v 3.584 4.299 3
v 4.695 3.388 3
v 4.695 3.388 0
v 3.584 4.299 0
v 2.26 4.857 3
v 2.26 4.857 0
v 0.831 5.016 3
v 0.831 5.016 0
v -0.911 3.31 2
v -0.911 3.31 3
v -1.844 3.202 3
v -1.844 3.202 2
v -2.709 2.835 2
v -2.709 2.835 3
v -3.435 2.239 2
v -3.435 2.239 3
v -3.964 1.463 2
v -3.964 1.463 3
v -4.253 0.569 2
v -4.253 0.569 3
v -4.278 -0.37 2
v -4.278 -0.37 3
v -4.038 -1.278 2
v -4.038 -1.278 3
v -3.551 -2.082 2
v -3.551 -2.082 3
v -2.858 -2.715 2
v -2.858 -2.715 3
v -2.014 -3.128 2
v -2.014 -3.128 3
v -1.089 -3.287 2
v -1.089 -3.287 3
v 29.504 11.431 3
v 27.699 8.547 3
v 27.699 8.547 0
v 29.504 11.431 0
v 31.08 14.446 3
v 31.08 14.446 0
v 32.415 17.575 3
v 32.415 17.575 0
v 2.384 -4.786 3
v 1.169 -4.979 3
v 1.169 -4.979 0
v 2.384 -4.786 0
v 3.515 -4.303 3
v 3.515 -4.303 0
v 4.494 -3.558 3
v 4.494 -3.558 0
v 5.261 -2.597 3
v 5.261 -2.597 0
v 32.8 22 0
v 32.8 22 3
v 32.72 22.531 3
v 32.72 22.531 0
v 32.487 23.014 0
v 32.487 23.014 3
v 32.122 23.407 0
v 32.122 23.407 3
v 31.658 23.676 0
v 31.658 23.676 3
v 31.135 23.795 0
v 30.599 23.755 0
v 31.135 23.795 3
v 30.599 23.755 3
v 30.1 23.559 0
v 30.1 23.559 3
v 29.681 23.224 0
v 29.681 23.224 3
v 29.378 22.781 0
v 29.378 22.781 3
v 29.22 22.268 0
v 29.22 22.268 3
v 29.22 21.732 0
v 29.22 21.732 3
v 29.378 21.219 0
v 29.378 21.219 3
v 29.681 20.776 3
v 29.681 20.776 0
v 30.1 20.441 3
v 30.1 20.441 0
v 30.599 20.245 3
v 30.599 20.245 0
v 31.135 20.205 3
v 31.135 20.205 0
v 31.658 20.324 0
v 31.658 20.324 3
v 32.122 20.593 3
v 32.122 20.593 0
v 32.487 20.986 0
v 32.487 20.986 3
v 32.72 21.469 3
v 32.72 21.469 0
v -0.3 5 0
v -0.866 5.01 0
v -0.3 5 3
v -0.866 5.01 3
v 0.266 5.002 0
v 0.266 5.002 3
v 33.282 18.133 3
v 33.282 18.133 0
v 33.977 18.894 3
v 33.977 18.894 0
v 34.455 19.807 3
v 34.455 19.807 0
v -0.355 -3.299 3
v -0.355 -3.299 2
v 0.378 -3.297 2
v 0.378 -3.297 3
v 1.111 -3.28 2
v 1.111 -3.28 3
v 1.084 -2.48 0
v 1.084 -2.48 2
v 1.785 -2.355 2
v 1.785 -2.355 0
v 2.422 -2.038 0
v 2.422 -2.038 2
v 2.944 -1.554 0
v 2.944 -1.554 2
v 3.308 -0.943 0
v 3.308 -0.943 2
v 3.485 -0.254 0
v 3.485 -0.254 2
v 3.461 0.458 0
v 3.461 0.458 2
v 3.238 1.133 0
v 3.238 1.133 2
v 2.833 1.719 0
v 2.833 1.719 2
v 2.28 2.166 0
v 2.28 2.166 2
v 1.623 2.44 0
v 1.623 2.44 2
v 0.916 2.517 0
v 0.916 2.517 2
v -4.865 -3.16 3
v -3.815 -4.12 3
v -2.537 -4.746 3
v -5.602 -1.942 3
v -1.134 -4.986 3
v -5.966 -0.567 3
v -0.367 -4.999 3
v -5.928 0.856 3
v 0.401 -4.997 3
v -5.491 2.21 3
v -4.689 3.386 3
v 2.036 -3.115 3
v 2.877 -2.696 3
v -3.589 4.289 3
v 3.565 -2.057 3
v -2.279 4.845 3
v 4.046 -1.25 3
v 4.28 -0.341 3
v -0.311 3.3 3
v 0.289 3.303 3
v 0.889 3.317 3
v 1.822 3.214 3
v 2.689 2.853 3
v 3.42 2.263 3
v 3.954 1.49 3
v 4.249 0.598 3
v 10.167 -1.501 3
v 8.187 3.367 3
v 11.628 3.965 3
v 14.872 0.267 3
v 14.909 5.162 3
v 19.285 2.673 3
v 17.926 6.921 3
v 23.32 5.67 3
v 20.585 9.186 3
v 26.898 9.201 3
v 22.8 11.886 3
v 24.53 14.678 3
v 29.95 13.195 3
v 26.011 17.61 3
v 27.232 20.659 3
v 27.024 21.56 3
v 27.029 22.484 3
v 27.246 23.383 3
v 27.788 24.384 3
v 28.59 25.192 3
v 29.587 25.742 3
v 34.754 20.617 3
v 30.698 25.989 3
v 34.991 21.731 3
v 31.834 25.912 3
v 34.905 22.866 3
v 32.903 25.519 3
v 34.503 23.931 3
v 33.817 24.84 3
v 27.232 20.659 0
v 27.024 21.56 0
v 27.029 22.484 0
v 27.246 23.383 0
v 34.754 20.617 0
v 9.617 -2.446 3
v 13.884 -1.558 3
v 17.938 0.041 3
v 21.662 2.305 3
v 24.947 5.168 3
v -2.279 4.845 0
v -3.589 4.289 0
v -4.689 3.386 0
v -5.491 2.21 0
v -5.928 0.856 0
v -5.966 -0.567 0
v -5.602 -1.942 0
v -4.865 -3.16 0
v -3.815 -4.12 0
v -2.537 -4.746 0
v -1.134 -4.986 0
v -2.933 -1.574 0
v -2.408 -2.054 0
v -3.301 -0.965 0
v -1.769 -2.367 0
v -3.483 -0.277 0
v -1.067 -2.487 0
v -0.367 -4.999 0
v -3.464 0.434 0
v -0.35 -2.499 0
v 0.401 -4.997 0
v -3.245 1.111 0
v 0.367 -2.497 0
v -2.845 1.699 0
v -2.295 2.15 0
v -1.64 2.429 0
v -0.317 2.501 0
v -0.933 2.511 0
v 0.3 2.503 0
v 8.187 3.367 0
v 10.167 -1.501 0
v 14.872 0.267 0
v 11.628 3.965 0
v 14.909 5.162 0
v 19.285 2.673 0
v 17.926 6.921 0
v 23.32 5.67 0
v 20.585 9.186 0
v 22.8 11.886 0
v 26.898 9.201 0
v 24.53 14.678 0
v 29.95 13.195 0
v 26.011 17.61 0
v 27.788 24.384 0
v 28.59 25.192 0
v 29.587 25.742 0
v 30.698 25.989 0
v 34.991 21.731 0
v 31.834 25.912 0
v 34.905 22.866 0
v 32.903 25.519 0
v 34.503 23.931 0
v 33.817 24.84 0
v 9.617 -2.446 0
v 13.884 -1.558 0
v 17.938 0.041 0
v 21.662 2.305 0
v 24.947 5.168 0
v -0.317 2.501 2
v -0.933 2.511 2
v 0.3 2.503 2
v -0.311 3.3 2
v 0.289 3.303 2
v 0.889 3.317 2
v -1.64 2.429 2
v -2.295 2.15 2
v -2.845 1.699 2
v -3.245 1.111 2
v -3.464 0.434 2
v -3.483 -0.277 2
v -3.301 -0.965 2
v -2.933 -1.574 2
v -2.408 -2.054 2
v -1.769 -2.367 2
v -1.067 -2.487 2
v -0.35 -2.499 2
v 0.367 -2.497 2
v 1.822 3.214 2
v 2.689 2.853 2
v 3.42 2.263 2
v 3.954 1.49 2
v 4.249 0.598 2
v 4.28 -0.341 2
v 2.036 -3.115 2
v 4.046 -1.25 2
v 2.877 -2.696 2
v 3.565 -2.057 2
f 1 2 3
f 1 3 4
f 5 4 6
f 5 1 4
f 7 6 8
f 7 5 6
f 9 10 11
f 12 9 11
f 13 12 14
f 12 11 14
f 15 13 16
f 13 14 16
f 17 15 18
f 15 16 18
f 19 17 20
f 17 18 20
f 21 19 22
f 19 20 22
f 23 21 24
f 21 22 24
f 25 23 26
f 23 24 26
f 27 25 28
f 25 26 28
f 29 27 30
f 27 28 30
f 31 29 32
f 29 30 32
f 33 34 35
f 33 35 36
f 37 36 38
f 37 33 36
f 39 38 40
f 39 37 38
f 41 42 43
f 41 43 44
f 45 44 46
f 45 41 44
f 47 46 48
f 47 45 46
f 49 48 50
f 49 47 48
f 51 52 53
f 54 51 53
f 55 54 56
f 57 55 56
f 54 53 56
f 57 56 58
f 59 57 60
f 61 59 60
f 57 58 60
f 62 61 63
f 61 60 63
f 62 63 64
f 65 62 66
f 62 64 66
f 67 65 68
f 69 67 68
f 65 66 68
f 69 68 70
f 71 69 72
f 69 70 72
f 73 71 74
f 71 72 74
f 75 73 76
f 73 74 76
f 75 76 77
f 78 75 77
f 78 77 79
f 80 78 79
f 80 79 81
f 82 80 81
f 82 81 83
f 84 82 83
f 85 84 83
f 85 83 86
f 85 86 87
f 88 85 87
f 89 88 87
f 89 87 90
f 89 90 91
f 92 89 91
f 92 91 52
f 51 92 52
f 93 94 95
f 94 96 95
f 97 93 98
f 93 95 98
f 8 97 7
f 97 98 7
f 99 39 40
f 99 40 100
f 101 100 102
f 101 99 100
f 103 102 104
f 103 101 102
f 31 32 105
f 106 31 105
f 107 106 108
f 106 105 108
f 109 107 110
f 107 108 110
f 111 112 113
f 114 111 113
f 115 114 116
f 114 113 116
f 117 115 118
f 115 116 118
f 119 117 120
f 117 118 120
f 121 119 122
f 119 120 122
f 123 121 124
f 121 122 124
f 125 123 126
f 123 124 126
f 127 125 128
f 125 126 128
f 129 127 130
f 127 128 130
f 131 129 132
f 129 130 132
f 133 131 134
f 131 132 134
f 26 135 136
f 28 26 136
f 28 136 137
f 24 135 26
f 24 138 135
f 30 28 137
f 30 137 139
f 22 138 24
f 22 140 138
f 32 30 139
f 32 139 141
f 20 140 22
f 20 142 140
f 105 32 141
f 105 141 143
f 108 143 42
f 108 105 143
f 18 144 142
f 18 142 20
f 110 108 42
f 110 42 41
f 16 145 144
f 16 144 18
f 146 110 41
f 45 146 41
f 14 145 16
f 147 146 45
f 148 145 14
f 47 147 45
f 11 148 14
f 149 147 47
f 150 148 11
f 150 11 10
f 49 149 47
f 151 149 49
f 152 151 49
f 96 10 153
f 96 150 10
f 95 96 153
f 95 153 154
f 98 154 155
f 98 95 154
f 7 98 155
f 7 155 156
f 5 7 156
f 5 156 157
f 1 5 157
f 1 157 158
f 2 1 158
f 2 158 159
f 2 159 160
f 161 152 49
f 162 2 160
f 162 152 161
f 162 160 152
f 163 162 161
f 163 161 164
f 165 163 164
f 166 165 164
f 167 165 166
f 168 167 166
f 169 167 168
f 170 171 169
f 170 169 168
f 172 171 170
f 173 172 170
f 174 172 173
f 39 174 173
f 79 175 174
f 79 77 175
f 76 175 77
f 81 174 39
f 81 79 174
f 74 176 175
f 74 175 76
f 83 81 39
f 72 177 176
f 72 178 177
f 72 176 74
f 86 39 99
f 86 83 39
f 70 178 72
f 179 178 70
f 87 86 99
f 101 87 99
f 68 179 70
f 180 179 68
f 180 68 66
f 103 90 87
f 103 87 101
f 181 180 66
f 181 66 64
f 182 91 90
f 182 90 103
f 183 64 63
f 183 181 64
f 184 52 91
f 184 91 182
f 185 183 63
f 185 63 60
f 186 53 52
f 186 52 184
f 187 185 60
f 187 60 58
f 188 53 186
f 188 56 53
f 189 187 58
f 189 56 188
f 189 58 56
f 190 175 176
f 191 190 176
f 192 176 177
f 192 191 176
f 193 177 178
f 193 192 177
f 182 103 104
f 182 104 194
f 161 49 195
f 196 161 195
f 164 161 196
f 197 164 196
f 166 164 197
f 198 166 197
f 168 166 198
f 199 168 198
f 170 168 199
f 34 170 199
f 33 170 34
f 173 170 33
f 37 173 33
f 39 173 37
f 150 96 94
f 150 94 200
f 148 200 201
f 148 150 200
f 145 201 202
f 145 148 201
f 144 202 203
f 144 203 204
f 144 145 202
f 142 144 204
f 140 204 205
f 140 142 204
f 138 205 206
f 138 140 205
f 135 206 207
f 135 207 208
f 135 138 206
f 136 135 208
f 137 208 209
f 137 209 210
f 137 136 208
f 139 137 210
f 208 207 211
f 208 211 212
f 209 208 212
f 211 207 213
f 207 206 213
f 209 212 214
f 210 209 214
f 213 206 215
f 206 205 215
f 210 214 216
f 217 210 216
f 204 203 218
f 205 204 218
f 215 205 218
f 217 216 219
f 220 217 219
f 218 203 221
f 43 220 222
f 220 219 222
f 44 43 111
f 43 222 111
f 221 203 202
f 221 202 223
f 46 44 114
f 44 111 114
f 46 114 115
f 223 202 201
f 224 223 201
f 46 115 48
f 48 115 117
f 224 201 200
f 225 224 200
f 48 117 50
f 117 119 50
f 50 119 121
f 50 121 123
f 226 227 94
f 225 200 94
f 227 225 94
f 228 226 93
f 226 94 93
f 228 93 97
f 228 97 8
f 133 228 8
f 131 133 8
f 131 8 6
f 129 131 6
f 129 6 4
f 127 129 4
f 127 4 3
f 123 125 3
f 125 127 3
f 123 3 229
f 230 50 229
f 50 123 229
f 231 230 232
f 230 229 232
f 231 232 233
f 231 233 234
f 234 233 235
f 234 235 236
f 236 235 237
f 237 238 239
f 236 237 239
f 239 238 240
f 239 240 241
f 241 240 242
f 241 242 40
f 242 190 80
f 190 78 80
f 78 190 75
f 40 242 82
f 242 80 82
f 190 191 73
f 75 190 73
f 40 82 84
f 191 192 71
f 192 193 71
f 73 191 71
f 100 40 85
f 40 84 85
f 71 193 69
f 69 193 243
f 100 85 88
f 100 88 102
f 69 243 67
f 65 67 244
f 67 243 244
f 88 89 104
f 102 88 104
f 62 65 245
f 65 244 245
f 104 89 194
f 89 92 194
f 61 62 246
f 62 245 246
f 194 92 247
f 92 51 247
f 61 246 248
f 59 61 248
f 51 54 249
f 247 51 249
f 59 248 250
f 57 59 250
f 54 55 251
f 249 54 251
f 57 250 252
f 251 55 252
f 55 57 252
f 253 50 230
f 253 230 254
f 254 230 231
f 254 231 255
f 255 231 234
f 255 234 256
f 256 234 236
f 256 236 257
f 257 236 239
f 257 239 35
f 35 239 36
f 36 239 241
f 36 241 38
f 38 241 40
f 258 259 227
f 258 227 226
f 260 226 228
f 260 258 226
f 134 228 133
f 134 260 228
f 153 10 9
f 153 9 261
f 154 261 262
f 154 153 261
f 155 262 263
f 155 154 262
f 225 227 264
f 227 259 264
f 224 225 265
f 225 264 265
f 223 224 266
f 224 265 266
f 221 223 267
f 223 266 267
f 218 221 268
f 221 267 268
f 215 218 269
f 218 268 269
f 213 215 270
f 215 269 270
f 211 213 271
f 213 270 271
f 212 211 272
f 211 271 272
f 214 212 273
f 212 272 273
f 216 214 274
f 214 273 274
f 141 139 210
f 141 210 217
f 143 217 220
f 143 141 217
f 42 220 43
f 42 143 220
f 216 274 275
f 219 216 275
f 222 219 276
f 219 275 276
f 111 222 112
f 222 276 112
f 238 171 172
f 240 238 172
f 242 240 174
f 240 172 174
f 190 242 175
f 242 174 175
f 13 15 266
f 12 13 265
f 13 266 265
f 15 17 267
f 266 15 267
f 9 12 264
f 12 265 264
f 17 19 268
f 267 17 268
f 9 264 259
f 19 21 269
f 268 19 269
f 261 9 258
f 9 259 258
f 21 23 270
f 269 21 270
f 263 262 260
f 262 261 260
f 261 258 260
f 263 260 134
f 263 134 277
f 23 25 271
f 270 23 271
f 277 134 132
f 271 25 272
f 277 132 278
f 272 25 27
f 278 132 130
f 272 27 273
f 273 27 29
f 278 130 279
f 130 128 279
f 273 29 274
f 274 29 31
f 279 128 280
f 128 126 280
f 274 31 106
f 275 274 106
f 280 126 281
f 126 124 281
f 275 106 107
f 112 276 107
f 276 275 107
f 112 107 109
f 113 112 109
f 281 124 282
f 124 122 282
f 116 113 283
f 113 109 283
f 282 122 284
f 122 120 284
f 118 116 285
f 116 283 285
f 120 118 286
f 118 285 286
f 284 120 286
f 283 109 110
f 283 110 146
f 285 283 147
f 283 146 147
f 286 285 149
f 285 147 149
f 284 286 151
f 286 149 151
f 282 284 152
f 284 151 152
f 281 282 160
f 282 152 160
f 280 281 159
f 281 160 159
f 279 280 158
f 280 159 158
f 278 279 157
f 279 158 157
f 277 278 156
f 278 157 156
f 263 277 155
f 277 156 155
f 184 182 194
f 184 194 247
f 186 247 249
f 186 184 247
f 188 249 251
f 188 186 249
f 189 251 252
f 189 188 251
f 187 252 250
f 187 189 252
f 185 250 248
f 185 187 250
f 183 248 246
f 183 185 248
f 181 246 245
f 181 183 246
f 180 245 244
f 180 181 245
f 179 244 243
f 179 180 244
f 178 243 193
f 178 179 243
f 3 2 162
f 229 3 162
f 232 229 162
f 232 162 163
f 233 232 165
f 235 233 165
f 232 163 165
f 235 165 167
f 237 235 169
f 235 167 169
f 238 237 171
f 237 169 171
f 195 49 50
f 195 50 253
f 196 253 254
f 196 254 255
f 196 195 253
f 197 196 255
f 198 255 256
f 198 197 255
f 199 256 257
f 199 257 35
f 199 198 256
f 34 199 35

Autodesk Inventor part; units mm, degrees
ref_plane "YZ Plane" through (0, 0, 0) normal (1, 0, 0) x (0, 1, 0)
ref_plane "XZ Plane" through (0, 0, 0) normal (0, 1, 0) x (-1, 0, 0)
ref_plane "XY Plane" through (0, 0, 0) normal (0, 0, 1) x (1, 0, 0)
sketch "Sketch1" plane through (0, 0, 0) normal (0, 0, 1) x (1, 0, 0)
  circle A0 centre (31, 22) radius 1.25
  circle A1 centre (31, 22) radius 3
  arc A2 (0, 0) -> (31, 22) centre (-0.1128, 32.9998) ccw construction
  arc A3 (0.0103, -3) -> (33.8284, 21) centre (-0.1128, 32.9998) ccw
  arc A4 (-0.0103, 3) -> (28.1716, 23) centre (-0.1128, 32.9998) ccw
  arc A5 (-0.0103, 3) -> (0.0103, -3) centre (0, 0) ccw
  arc A6 (33.8284, 21) -> (28.1716, 23) centre (31, 22) ccw
  point P0 (41.5332, 21.1583)
  point P1 (35.8668, 23.1312)
  point P2 (33.8284, 21)
  point P3 (28.1716, 23)
  dimension "d1" = 30
  dimension "d21" = 6
  dimension "d22" = 2.5
  dimension "d23" = 31
  dimension "d24" = 22
extrude "Extrusion1" add sketch "Sketch1" along normal blind 3
sketch "Sketch3" plane through (0, 0, 3) normal (0, 0, 1) x (1, 0, 0)
  arc A0 (-1, 0.0117) -> (1, 0.0186) centre (-0.1128, 32.9998) ccw construction
  arc A1 (-1.1344, -4.9865) -> (1.1686, -4.9786) centre (-0.1128, 32.9998) ccw
  arc A2 (-0.8656, 5.0099) -> (0.8314, 5.0157) centre (-0.1128, 32.9998) ccw
  arc A3 (-0.8656, 5.0099) -> (-1.1344, -4.9865) centre (-1, 0.0117) ccw
  arc A4 (1.1686, -4.9786) -> (0.8314, 5.0157) centre (1, 0.0186) ccw
  arc A5 (0.0103, -3) -> (33.8284, 21) centre (-0.1128, 32.9998) ccw projected
  point P0 (0, 0)
  dimension "d31" = 10
  dimension "d32" = 1
  dimension "d33" = 1
extrude "Extrusion3" add sketch "Sketch3" against normal blind 3
sketch "Sketch4" plane through (0, 0, 3) normal (0, 0, -1) x (1, 0, 0)
  arc A0 (-1.1344, 4.9865) -> (-0.8656, -5.0099) centre (-1, -0.0117) ccw projected
  arc A1 (1.1686, 4.9786) -> (-1.1344, 4.9865) centre (-0.1128, -32.9998) ccw projected
  arc A2 (0.8314, -5.0157) -> (-0.8656, -5.0099) centre (-0.1128, -32.9998) ccw projected
  arc A3 (1, -0.0186) -> (-1, -0.0117) centre (-0.1128, -32.9998) ccw construction
  arc A4 (1.0843, 2.48) -> (-1.0672, 2.4874) centre (-0.1128, -32.9998) ccw
  arc A5 (0.9157, -2.5172) -> (-0.9328, -2.5108) centre (-0.1128, -32.9998) ccw
  arc A6 (0.9157, -2.5172) -> (1.0843, 2.48) centre (1, -0.0186) ccw
  arc A7 (-1.0672, 2.4874) -> (-0.9328, -2.5108) centre (-1, -0.0117) ccw
  arc A8 (28.1716, -23) -> (4.6946, -3.3875) centre (-0.1128, -32.9998) ccw projected
  arc A9 (28.1716, -23) -> (33.8284, -21) centre (31, -22) ccw projected
  arc A10 (33.8284, -21) -> (5.2614, 2.5968) centre (-0.1128, -32.9998) ccw projected
  arc A11 (5.2614, 2.5968) -> (1.1686, 4.9786) centre (1, -0.0186) ccw projected
  arc A12 (0.8314, -5.0157) -> (4.6946, -3.3875) centre (1, -0.0186) ccw projected
  arc A13 (0.8887, -3.3167) -> (-0.9113, -3.3105) centre (-0.1128, -32.9998) ccw
  arc A14 (0.8887, -3.3167) -> (1.1113, 3.2795) centre (1, -0.0186) ccw
  arc A15 (1.1113, 3.2795) -> (-1.0887, 3.2871) centre (-0.1128, -32.9998) ccw
  arc A16 (-1.0887, 3.2871) -> (-0.9113, -3.3105) centre (-1, -0.0117) ccw
  point P0 (0, 0)
  dimension "d43" = 5
  dimension "d52" = 0.8
extrude "Extrusion4" cut sketch "Sketch4" along normal through all contours A6 A5 A7 A4
sketch "Sketch5" plane through (0, 0, 3) normal (0, 0, 1) x (1, 0, 0)
  circle A0 centre (31, 22) radius 1.25 projected
  arc A1 (0, 0) -> (31, 22) centre (-0.1128, 32.9998) ccw construction
  arc A2 (34.7535, 20.6174) -> (27.2465, 23.3826) centre (31, 22) ccw
  arc A3 (26.9479, 22.5719) -> (34.4549, 19.8068) centre (30.7014, 21.1893) ccw
  line L0 (30.0441, 21.4413) -> (31.2665, 20.9727)
  line L1 (32.5586, 21.449) -> (29.5201, 22.5232)
  line L2 (26.9479, 22.5719) -> (27.2465, 23.3826)
  line L3 (34.4549, 19.8068) -> (34.7535, 20.6174)
  circle A4 centre (31, 22) radius 1.8
  dimension "d44" = 8
  dimension "d46" = 1.5
  dimension "d47" = 3.6
extrude "Extrusion5" cut sketch "Sketch5" against normal up to surface (3 mm away) contours A4
extrude "Extrusion6" add sketch "Sketch5" against normal up to surface (3 mm away) contours L3 A3 L2 A2
extrude "Extrusion7" cut sketch "Sketch4" along normal blind 1 contours A13 A16 A15 A14
sketch "Sketch6" plane through (0, 0, 0) normal (0, 0, -1) x (-1, 0, 0)
  circle A0 centre (-31, 22) radius 1.8 projected
  arc A1 (-32.4154, 17.5752) -> (-5.2614, -2.5968) centre (0.1128, 32.9998) ccw projected
  arc A2 (-5.2614, -2.5968) -> (-1.1686, -4.9786) centre (-1, 0.0186) ccw projected
  arc A3 (-1.1686, -4.9786) -> (1.1344, -4.9865) centre (0.1128, 32.9998) ccw projected
  arc A4 (1.1344, -4.9865) -> (0.8656, 5.0099) centre (1, 0.0117) ccw projected
  arc A5 (-0.8314, 5.0157) -> (0.8656, 5.0099) centre (0.1128, 32.9998) ccw projected
  arc A6 (-0.8314, 5.0157) -> (-4.6946, 3.3875) centre (-1, 0.0186) ccw projected
  arc A7 (-26.899, 19.9475) -> (-4.6946, 3.3875) centre (0.1128, 32.9998) ccw projected
  arc A8 (-26.899, 19.9475) -> (-26.9479, 22.5719) centre (-30.7014, 21.1893) ccw projected
  line L0 (-26.9479, 22.5719) -> (-27.2465, 23.3826) projected
  arc A9 (-27.2465, 23.3826) -> (-34.7535, 20.6174) centre (-31, 22) ccw projected
  line L1 (-34.7535, 20.6174) -> (-34.4549, 19.8068) projected
  arc A10 (-34.4549, 19.8068) -> (-32.4154, 17.5752) centre (-30.7014, 21.1893) ccw projected
  arc A11 (-1.0843, -2.48) -> (1.0672, -2.4874) centre (0.1128, 32.9998) ccw projected
  arc A12 (-0.9157, 2.5172) -> (-1.0843, -2.48) centre (-1, 0.0186) ccw projected
  arc A13 (-0.9157, 2.5172) -> (0.9328, 2.5108) centre (0.1128, 32.9998) ccw projected
  arc A14 (1.0672, -2.4874) -> (0.9328, 2.5108) centre (1, 0.0117) ccw projected
  arc A15 (-27.2465, 23.3826) -> (-34.7535, 20.6174) centre (-31, 22) ccw projected
  arc A16 (-27.2315, 20.6591) -> (-27.2465, 23.3826) centre (-31, 22) ccw
  arc A17 (-26.899, 19.9475) -> (-4.6946, 3.3875) centre (0.1128, 32.9998) ccw projected
  arc A18 (-27.2315, 20.6591) -> (-26.899, 19.9475) centre (0.1128, 32.9998) ccw
  arc A19 (-26.899, 19.9475) -> (-4.6946, 3.3875) centre (0.1128, 32.9998) ccw projected
  point P0 (0, 0)
extrude "Extrusion8" cut sketch "Sketch6" against normal up to surface (3 mm away) contours L0 A8 A18 A16
sketch "Sketch7" plane through (0, 0, 3) normal (0, 0, 1) x (1, 0, 0)
  arc A0 (34.7535, 20.6174) -> (27.2315, 20.6591) centre (31, 22) ccw projected
  arc A1 (4.6946, 3.3875) -> (27.2315, 20.6591) centre (-0.1128, 32.9998) ccw projected
  arc A2 (4.6946, 3.3875) -> (0.8314, 5.0157) centre (1, 0.0186) ccw projected
  arc A3 (-0.8656, 5.0099) -> (0.8314, 5.0157) centre (-0.1128, 32.9998) ccw projected
  arc A4 (-0.8656, 5.0099) -> (-1.1344, -4.9865) centre (-1, 0.0117) ccw projected
  arc A5 (-1.1344, -4.9865) -> (1.1686, -4.9786) centre (-0.1128, 32.9998) ccw projected
  arc A6 (1.1686, -4.9786) -> (5.2614, -2.5968) centre (1, 0.0186) ccw projected
  arc A7 (5.2614, -2.5968) -> (32.4154, 17.5752) centre (-0.1128, 32.9998) ccw projected
  arc A8 (32.4154, 17.5752) -> (34.4549, 19.8068) centre (30.7014, 21.1893) ccw projected
  line L0 (34.4549, 19.8068) -> (34.7535, 20.6174) projected
  circle A9 centre (31, 22) radius 1.8 projected
  arc A10 (-1.0887, -3.2871) -> (1.1113, -3.2795) centre (-0.1128, 32.9998) ccw projected
  arc A11 (-0.9113, 3.3105) -> (-1.0887, -3.2871) centre (-1, 0.0117) ccw projected
  arc A12 (-0.9113, 3.3105) -> (0.8887, 3.3167) centre (-0.1128, 32.9998) ccw projected
  arc A13 (1.1113, -3.2795) -> (0.8887, 3.3167) centre (1, 0.0186) ccw projected
  arc A14 (5.2614, -2.5968) -> (32.4154, 17.5752) centre (-0.1128, 32.9998) ccw projected
  arc A15 (5.2614, -2.5968) -> (27.6993, 8.5472) centre (6.5569, 22.9556) ccw
  arc A16 (27.6993, 8.5472) -> (32.4154, 17.5752) centre (-8.4143, 33.1583) ccw
  arc A17 (4.6946, 3.3875) -> (22.8001, 11.886) centre (6.5569, 22.9556) ccw
  arc A18 (34.7535, 20.6174) -> (27.2315, 20.6591) centre (31, 22) ccw projected
  arc A19 (22.8001, 11.886) -> (27.2315, 20.6591) centre (-8.4143, 33.1583) ccw
  line L1 (5.2614, -2.5968) -> (4.6946, 3.3875)
  line L2 (4.6946, 3.3875) -> (2.1704, 20.8058)
  line L3 (2.1704, 20.8058) -> (15.0141, 27.6003)
  line L4 (15.0141, 27.6003) -> (27.2315, 20.6591)
  point P0 (0, 0)
extrude "Extrusion9" cut sketch "Sketch7" against normal up to surface (3 mm away) contours A19 A17 A1 | A1 L2 L3 L4
extrude "Extrusion10" add sketch "Sketch7" against normal up to surface (3 mm away) contours A16 A15 A7
